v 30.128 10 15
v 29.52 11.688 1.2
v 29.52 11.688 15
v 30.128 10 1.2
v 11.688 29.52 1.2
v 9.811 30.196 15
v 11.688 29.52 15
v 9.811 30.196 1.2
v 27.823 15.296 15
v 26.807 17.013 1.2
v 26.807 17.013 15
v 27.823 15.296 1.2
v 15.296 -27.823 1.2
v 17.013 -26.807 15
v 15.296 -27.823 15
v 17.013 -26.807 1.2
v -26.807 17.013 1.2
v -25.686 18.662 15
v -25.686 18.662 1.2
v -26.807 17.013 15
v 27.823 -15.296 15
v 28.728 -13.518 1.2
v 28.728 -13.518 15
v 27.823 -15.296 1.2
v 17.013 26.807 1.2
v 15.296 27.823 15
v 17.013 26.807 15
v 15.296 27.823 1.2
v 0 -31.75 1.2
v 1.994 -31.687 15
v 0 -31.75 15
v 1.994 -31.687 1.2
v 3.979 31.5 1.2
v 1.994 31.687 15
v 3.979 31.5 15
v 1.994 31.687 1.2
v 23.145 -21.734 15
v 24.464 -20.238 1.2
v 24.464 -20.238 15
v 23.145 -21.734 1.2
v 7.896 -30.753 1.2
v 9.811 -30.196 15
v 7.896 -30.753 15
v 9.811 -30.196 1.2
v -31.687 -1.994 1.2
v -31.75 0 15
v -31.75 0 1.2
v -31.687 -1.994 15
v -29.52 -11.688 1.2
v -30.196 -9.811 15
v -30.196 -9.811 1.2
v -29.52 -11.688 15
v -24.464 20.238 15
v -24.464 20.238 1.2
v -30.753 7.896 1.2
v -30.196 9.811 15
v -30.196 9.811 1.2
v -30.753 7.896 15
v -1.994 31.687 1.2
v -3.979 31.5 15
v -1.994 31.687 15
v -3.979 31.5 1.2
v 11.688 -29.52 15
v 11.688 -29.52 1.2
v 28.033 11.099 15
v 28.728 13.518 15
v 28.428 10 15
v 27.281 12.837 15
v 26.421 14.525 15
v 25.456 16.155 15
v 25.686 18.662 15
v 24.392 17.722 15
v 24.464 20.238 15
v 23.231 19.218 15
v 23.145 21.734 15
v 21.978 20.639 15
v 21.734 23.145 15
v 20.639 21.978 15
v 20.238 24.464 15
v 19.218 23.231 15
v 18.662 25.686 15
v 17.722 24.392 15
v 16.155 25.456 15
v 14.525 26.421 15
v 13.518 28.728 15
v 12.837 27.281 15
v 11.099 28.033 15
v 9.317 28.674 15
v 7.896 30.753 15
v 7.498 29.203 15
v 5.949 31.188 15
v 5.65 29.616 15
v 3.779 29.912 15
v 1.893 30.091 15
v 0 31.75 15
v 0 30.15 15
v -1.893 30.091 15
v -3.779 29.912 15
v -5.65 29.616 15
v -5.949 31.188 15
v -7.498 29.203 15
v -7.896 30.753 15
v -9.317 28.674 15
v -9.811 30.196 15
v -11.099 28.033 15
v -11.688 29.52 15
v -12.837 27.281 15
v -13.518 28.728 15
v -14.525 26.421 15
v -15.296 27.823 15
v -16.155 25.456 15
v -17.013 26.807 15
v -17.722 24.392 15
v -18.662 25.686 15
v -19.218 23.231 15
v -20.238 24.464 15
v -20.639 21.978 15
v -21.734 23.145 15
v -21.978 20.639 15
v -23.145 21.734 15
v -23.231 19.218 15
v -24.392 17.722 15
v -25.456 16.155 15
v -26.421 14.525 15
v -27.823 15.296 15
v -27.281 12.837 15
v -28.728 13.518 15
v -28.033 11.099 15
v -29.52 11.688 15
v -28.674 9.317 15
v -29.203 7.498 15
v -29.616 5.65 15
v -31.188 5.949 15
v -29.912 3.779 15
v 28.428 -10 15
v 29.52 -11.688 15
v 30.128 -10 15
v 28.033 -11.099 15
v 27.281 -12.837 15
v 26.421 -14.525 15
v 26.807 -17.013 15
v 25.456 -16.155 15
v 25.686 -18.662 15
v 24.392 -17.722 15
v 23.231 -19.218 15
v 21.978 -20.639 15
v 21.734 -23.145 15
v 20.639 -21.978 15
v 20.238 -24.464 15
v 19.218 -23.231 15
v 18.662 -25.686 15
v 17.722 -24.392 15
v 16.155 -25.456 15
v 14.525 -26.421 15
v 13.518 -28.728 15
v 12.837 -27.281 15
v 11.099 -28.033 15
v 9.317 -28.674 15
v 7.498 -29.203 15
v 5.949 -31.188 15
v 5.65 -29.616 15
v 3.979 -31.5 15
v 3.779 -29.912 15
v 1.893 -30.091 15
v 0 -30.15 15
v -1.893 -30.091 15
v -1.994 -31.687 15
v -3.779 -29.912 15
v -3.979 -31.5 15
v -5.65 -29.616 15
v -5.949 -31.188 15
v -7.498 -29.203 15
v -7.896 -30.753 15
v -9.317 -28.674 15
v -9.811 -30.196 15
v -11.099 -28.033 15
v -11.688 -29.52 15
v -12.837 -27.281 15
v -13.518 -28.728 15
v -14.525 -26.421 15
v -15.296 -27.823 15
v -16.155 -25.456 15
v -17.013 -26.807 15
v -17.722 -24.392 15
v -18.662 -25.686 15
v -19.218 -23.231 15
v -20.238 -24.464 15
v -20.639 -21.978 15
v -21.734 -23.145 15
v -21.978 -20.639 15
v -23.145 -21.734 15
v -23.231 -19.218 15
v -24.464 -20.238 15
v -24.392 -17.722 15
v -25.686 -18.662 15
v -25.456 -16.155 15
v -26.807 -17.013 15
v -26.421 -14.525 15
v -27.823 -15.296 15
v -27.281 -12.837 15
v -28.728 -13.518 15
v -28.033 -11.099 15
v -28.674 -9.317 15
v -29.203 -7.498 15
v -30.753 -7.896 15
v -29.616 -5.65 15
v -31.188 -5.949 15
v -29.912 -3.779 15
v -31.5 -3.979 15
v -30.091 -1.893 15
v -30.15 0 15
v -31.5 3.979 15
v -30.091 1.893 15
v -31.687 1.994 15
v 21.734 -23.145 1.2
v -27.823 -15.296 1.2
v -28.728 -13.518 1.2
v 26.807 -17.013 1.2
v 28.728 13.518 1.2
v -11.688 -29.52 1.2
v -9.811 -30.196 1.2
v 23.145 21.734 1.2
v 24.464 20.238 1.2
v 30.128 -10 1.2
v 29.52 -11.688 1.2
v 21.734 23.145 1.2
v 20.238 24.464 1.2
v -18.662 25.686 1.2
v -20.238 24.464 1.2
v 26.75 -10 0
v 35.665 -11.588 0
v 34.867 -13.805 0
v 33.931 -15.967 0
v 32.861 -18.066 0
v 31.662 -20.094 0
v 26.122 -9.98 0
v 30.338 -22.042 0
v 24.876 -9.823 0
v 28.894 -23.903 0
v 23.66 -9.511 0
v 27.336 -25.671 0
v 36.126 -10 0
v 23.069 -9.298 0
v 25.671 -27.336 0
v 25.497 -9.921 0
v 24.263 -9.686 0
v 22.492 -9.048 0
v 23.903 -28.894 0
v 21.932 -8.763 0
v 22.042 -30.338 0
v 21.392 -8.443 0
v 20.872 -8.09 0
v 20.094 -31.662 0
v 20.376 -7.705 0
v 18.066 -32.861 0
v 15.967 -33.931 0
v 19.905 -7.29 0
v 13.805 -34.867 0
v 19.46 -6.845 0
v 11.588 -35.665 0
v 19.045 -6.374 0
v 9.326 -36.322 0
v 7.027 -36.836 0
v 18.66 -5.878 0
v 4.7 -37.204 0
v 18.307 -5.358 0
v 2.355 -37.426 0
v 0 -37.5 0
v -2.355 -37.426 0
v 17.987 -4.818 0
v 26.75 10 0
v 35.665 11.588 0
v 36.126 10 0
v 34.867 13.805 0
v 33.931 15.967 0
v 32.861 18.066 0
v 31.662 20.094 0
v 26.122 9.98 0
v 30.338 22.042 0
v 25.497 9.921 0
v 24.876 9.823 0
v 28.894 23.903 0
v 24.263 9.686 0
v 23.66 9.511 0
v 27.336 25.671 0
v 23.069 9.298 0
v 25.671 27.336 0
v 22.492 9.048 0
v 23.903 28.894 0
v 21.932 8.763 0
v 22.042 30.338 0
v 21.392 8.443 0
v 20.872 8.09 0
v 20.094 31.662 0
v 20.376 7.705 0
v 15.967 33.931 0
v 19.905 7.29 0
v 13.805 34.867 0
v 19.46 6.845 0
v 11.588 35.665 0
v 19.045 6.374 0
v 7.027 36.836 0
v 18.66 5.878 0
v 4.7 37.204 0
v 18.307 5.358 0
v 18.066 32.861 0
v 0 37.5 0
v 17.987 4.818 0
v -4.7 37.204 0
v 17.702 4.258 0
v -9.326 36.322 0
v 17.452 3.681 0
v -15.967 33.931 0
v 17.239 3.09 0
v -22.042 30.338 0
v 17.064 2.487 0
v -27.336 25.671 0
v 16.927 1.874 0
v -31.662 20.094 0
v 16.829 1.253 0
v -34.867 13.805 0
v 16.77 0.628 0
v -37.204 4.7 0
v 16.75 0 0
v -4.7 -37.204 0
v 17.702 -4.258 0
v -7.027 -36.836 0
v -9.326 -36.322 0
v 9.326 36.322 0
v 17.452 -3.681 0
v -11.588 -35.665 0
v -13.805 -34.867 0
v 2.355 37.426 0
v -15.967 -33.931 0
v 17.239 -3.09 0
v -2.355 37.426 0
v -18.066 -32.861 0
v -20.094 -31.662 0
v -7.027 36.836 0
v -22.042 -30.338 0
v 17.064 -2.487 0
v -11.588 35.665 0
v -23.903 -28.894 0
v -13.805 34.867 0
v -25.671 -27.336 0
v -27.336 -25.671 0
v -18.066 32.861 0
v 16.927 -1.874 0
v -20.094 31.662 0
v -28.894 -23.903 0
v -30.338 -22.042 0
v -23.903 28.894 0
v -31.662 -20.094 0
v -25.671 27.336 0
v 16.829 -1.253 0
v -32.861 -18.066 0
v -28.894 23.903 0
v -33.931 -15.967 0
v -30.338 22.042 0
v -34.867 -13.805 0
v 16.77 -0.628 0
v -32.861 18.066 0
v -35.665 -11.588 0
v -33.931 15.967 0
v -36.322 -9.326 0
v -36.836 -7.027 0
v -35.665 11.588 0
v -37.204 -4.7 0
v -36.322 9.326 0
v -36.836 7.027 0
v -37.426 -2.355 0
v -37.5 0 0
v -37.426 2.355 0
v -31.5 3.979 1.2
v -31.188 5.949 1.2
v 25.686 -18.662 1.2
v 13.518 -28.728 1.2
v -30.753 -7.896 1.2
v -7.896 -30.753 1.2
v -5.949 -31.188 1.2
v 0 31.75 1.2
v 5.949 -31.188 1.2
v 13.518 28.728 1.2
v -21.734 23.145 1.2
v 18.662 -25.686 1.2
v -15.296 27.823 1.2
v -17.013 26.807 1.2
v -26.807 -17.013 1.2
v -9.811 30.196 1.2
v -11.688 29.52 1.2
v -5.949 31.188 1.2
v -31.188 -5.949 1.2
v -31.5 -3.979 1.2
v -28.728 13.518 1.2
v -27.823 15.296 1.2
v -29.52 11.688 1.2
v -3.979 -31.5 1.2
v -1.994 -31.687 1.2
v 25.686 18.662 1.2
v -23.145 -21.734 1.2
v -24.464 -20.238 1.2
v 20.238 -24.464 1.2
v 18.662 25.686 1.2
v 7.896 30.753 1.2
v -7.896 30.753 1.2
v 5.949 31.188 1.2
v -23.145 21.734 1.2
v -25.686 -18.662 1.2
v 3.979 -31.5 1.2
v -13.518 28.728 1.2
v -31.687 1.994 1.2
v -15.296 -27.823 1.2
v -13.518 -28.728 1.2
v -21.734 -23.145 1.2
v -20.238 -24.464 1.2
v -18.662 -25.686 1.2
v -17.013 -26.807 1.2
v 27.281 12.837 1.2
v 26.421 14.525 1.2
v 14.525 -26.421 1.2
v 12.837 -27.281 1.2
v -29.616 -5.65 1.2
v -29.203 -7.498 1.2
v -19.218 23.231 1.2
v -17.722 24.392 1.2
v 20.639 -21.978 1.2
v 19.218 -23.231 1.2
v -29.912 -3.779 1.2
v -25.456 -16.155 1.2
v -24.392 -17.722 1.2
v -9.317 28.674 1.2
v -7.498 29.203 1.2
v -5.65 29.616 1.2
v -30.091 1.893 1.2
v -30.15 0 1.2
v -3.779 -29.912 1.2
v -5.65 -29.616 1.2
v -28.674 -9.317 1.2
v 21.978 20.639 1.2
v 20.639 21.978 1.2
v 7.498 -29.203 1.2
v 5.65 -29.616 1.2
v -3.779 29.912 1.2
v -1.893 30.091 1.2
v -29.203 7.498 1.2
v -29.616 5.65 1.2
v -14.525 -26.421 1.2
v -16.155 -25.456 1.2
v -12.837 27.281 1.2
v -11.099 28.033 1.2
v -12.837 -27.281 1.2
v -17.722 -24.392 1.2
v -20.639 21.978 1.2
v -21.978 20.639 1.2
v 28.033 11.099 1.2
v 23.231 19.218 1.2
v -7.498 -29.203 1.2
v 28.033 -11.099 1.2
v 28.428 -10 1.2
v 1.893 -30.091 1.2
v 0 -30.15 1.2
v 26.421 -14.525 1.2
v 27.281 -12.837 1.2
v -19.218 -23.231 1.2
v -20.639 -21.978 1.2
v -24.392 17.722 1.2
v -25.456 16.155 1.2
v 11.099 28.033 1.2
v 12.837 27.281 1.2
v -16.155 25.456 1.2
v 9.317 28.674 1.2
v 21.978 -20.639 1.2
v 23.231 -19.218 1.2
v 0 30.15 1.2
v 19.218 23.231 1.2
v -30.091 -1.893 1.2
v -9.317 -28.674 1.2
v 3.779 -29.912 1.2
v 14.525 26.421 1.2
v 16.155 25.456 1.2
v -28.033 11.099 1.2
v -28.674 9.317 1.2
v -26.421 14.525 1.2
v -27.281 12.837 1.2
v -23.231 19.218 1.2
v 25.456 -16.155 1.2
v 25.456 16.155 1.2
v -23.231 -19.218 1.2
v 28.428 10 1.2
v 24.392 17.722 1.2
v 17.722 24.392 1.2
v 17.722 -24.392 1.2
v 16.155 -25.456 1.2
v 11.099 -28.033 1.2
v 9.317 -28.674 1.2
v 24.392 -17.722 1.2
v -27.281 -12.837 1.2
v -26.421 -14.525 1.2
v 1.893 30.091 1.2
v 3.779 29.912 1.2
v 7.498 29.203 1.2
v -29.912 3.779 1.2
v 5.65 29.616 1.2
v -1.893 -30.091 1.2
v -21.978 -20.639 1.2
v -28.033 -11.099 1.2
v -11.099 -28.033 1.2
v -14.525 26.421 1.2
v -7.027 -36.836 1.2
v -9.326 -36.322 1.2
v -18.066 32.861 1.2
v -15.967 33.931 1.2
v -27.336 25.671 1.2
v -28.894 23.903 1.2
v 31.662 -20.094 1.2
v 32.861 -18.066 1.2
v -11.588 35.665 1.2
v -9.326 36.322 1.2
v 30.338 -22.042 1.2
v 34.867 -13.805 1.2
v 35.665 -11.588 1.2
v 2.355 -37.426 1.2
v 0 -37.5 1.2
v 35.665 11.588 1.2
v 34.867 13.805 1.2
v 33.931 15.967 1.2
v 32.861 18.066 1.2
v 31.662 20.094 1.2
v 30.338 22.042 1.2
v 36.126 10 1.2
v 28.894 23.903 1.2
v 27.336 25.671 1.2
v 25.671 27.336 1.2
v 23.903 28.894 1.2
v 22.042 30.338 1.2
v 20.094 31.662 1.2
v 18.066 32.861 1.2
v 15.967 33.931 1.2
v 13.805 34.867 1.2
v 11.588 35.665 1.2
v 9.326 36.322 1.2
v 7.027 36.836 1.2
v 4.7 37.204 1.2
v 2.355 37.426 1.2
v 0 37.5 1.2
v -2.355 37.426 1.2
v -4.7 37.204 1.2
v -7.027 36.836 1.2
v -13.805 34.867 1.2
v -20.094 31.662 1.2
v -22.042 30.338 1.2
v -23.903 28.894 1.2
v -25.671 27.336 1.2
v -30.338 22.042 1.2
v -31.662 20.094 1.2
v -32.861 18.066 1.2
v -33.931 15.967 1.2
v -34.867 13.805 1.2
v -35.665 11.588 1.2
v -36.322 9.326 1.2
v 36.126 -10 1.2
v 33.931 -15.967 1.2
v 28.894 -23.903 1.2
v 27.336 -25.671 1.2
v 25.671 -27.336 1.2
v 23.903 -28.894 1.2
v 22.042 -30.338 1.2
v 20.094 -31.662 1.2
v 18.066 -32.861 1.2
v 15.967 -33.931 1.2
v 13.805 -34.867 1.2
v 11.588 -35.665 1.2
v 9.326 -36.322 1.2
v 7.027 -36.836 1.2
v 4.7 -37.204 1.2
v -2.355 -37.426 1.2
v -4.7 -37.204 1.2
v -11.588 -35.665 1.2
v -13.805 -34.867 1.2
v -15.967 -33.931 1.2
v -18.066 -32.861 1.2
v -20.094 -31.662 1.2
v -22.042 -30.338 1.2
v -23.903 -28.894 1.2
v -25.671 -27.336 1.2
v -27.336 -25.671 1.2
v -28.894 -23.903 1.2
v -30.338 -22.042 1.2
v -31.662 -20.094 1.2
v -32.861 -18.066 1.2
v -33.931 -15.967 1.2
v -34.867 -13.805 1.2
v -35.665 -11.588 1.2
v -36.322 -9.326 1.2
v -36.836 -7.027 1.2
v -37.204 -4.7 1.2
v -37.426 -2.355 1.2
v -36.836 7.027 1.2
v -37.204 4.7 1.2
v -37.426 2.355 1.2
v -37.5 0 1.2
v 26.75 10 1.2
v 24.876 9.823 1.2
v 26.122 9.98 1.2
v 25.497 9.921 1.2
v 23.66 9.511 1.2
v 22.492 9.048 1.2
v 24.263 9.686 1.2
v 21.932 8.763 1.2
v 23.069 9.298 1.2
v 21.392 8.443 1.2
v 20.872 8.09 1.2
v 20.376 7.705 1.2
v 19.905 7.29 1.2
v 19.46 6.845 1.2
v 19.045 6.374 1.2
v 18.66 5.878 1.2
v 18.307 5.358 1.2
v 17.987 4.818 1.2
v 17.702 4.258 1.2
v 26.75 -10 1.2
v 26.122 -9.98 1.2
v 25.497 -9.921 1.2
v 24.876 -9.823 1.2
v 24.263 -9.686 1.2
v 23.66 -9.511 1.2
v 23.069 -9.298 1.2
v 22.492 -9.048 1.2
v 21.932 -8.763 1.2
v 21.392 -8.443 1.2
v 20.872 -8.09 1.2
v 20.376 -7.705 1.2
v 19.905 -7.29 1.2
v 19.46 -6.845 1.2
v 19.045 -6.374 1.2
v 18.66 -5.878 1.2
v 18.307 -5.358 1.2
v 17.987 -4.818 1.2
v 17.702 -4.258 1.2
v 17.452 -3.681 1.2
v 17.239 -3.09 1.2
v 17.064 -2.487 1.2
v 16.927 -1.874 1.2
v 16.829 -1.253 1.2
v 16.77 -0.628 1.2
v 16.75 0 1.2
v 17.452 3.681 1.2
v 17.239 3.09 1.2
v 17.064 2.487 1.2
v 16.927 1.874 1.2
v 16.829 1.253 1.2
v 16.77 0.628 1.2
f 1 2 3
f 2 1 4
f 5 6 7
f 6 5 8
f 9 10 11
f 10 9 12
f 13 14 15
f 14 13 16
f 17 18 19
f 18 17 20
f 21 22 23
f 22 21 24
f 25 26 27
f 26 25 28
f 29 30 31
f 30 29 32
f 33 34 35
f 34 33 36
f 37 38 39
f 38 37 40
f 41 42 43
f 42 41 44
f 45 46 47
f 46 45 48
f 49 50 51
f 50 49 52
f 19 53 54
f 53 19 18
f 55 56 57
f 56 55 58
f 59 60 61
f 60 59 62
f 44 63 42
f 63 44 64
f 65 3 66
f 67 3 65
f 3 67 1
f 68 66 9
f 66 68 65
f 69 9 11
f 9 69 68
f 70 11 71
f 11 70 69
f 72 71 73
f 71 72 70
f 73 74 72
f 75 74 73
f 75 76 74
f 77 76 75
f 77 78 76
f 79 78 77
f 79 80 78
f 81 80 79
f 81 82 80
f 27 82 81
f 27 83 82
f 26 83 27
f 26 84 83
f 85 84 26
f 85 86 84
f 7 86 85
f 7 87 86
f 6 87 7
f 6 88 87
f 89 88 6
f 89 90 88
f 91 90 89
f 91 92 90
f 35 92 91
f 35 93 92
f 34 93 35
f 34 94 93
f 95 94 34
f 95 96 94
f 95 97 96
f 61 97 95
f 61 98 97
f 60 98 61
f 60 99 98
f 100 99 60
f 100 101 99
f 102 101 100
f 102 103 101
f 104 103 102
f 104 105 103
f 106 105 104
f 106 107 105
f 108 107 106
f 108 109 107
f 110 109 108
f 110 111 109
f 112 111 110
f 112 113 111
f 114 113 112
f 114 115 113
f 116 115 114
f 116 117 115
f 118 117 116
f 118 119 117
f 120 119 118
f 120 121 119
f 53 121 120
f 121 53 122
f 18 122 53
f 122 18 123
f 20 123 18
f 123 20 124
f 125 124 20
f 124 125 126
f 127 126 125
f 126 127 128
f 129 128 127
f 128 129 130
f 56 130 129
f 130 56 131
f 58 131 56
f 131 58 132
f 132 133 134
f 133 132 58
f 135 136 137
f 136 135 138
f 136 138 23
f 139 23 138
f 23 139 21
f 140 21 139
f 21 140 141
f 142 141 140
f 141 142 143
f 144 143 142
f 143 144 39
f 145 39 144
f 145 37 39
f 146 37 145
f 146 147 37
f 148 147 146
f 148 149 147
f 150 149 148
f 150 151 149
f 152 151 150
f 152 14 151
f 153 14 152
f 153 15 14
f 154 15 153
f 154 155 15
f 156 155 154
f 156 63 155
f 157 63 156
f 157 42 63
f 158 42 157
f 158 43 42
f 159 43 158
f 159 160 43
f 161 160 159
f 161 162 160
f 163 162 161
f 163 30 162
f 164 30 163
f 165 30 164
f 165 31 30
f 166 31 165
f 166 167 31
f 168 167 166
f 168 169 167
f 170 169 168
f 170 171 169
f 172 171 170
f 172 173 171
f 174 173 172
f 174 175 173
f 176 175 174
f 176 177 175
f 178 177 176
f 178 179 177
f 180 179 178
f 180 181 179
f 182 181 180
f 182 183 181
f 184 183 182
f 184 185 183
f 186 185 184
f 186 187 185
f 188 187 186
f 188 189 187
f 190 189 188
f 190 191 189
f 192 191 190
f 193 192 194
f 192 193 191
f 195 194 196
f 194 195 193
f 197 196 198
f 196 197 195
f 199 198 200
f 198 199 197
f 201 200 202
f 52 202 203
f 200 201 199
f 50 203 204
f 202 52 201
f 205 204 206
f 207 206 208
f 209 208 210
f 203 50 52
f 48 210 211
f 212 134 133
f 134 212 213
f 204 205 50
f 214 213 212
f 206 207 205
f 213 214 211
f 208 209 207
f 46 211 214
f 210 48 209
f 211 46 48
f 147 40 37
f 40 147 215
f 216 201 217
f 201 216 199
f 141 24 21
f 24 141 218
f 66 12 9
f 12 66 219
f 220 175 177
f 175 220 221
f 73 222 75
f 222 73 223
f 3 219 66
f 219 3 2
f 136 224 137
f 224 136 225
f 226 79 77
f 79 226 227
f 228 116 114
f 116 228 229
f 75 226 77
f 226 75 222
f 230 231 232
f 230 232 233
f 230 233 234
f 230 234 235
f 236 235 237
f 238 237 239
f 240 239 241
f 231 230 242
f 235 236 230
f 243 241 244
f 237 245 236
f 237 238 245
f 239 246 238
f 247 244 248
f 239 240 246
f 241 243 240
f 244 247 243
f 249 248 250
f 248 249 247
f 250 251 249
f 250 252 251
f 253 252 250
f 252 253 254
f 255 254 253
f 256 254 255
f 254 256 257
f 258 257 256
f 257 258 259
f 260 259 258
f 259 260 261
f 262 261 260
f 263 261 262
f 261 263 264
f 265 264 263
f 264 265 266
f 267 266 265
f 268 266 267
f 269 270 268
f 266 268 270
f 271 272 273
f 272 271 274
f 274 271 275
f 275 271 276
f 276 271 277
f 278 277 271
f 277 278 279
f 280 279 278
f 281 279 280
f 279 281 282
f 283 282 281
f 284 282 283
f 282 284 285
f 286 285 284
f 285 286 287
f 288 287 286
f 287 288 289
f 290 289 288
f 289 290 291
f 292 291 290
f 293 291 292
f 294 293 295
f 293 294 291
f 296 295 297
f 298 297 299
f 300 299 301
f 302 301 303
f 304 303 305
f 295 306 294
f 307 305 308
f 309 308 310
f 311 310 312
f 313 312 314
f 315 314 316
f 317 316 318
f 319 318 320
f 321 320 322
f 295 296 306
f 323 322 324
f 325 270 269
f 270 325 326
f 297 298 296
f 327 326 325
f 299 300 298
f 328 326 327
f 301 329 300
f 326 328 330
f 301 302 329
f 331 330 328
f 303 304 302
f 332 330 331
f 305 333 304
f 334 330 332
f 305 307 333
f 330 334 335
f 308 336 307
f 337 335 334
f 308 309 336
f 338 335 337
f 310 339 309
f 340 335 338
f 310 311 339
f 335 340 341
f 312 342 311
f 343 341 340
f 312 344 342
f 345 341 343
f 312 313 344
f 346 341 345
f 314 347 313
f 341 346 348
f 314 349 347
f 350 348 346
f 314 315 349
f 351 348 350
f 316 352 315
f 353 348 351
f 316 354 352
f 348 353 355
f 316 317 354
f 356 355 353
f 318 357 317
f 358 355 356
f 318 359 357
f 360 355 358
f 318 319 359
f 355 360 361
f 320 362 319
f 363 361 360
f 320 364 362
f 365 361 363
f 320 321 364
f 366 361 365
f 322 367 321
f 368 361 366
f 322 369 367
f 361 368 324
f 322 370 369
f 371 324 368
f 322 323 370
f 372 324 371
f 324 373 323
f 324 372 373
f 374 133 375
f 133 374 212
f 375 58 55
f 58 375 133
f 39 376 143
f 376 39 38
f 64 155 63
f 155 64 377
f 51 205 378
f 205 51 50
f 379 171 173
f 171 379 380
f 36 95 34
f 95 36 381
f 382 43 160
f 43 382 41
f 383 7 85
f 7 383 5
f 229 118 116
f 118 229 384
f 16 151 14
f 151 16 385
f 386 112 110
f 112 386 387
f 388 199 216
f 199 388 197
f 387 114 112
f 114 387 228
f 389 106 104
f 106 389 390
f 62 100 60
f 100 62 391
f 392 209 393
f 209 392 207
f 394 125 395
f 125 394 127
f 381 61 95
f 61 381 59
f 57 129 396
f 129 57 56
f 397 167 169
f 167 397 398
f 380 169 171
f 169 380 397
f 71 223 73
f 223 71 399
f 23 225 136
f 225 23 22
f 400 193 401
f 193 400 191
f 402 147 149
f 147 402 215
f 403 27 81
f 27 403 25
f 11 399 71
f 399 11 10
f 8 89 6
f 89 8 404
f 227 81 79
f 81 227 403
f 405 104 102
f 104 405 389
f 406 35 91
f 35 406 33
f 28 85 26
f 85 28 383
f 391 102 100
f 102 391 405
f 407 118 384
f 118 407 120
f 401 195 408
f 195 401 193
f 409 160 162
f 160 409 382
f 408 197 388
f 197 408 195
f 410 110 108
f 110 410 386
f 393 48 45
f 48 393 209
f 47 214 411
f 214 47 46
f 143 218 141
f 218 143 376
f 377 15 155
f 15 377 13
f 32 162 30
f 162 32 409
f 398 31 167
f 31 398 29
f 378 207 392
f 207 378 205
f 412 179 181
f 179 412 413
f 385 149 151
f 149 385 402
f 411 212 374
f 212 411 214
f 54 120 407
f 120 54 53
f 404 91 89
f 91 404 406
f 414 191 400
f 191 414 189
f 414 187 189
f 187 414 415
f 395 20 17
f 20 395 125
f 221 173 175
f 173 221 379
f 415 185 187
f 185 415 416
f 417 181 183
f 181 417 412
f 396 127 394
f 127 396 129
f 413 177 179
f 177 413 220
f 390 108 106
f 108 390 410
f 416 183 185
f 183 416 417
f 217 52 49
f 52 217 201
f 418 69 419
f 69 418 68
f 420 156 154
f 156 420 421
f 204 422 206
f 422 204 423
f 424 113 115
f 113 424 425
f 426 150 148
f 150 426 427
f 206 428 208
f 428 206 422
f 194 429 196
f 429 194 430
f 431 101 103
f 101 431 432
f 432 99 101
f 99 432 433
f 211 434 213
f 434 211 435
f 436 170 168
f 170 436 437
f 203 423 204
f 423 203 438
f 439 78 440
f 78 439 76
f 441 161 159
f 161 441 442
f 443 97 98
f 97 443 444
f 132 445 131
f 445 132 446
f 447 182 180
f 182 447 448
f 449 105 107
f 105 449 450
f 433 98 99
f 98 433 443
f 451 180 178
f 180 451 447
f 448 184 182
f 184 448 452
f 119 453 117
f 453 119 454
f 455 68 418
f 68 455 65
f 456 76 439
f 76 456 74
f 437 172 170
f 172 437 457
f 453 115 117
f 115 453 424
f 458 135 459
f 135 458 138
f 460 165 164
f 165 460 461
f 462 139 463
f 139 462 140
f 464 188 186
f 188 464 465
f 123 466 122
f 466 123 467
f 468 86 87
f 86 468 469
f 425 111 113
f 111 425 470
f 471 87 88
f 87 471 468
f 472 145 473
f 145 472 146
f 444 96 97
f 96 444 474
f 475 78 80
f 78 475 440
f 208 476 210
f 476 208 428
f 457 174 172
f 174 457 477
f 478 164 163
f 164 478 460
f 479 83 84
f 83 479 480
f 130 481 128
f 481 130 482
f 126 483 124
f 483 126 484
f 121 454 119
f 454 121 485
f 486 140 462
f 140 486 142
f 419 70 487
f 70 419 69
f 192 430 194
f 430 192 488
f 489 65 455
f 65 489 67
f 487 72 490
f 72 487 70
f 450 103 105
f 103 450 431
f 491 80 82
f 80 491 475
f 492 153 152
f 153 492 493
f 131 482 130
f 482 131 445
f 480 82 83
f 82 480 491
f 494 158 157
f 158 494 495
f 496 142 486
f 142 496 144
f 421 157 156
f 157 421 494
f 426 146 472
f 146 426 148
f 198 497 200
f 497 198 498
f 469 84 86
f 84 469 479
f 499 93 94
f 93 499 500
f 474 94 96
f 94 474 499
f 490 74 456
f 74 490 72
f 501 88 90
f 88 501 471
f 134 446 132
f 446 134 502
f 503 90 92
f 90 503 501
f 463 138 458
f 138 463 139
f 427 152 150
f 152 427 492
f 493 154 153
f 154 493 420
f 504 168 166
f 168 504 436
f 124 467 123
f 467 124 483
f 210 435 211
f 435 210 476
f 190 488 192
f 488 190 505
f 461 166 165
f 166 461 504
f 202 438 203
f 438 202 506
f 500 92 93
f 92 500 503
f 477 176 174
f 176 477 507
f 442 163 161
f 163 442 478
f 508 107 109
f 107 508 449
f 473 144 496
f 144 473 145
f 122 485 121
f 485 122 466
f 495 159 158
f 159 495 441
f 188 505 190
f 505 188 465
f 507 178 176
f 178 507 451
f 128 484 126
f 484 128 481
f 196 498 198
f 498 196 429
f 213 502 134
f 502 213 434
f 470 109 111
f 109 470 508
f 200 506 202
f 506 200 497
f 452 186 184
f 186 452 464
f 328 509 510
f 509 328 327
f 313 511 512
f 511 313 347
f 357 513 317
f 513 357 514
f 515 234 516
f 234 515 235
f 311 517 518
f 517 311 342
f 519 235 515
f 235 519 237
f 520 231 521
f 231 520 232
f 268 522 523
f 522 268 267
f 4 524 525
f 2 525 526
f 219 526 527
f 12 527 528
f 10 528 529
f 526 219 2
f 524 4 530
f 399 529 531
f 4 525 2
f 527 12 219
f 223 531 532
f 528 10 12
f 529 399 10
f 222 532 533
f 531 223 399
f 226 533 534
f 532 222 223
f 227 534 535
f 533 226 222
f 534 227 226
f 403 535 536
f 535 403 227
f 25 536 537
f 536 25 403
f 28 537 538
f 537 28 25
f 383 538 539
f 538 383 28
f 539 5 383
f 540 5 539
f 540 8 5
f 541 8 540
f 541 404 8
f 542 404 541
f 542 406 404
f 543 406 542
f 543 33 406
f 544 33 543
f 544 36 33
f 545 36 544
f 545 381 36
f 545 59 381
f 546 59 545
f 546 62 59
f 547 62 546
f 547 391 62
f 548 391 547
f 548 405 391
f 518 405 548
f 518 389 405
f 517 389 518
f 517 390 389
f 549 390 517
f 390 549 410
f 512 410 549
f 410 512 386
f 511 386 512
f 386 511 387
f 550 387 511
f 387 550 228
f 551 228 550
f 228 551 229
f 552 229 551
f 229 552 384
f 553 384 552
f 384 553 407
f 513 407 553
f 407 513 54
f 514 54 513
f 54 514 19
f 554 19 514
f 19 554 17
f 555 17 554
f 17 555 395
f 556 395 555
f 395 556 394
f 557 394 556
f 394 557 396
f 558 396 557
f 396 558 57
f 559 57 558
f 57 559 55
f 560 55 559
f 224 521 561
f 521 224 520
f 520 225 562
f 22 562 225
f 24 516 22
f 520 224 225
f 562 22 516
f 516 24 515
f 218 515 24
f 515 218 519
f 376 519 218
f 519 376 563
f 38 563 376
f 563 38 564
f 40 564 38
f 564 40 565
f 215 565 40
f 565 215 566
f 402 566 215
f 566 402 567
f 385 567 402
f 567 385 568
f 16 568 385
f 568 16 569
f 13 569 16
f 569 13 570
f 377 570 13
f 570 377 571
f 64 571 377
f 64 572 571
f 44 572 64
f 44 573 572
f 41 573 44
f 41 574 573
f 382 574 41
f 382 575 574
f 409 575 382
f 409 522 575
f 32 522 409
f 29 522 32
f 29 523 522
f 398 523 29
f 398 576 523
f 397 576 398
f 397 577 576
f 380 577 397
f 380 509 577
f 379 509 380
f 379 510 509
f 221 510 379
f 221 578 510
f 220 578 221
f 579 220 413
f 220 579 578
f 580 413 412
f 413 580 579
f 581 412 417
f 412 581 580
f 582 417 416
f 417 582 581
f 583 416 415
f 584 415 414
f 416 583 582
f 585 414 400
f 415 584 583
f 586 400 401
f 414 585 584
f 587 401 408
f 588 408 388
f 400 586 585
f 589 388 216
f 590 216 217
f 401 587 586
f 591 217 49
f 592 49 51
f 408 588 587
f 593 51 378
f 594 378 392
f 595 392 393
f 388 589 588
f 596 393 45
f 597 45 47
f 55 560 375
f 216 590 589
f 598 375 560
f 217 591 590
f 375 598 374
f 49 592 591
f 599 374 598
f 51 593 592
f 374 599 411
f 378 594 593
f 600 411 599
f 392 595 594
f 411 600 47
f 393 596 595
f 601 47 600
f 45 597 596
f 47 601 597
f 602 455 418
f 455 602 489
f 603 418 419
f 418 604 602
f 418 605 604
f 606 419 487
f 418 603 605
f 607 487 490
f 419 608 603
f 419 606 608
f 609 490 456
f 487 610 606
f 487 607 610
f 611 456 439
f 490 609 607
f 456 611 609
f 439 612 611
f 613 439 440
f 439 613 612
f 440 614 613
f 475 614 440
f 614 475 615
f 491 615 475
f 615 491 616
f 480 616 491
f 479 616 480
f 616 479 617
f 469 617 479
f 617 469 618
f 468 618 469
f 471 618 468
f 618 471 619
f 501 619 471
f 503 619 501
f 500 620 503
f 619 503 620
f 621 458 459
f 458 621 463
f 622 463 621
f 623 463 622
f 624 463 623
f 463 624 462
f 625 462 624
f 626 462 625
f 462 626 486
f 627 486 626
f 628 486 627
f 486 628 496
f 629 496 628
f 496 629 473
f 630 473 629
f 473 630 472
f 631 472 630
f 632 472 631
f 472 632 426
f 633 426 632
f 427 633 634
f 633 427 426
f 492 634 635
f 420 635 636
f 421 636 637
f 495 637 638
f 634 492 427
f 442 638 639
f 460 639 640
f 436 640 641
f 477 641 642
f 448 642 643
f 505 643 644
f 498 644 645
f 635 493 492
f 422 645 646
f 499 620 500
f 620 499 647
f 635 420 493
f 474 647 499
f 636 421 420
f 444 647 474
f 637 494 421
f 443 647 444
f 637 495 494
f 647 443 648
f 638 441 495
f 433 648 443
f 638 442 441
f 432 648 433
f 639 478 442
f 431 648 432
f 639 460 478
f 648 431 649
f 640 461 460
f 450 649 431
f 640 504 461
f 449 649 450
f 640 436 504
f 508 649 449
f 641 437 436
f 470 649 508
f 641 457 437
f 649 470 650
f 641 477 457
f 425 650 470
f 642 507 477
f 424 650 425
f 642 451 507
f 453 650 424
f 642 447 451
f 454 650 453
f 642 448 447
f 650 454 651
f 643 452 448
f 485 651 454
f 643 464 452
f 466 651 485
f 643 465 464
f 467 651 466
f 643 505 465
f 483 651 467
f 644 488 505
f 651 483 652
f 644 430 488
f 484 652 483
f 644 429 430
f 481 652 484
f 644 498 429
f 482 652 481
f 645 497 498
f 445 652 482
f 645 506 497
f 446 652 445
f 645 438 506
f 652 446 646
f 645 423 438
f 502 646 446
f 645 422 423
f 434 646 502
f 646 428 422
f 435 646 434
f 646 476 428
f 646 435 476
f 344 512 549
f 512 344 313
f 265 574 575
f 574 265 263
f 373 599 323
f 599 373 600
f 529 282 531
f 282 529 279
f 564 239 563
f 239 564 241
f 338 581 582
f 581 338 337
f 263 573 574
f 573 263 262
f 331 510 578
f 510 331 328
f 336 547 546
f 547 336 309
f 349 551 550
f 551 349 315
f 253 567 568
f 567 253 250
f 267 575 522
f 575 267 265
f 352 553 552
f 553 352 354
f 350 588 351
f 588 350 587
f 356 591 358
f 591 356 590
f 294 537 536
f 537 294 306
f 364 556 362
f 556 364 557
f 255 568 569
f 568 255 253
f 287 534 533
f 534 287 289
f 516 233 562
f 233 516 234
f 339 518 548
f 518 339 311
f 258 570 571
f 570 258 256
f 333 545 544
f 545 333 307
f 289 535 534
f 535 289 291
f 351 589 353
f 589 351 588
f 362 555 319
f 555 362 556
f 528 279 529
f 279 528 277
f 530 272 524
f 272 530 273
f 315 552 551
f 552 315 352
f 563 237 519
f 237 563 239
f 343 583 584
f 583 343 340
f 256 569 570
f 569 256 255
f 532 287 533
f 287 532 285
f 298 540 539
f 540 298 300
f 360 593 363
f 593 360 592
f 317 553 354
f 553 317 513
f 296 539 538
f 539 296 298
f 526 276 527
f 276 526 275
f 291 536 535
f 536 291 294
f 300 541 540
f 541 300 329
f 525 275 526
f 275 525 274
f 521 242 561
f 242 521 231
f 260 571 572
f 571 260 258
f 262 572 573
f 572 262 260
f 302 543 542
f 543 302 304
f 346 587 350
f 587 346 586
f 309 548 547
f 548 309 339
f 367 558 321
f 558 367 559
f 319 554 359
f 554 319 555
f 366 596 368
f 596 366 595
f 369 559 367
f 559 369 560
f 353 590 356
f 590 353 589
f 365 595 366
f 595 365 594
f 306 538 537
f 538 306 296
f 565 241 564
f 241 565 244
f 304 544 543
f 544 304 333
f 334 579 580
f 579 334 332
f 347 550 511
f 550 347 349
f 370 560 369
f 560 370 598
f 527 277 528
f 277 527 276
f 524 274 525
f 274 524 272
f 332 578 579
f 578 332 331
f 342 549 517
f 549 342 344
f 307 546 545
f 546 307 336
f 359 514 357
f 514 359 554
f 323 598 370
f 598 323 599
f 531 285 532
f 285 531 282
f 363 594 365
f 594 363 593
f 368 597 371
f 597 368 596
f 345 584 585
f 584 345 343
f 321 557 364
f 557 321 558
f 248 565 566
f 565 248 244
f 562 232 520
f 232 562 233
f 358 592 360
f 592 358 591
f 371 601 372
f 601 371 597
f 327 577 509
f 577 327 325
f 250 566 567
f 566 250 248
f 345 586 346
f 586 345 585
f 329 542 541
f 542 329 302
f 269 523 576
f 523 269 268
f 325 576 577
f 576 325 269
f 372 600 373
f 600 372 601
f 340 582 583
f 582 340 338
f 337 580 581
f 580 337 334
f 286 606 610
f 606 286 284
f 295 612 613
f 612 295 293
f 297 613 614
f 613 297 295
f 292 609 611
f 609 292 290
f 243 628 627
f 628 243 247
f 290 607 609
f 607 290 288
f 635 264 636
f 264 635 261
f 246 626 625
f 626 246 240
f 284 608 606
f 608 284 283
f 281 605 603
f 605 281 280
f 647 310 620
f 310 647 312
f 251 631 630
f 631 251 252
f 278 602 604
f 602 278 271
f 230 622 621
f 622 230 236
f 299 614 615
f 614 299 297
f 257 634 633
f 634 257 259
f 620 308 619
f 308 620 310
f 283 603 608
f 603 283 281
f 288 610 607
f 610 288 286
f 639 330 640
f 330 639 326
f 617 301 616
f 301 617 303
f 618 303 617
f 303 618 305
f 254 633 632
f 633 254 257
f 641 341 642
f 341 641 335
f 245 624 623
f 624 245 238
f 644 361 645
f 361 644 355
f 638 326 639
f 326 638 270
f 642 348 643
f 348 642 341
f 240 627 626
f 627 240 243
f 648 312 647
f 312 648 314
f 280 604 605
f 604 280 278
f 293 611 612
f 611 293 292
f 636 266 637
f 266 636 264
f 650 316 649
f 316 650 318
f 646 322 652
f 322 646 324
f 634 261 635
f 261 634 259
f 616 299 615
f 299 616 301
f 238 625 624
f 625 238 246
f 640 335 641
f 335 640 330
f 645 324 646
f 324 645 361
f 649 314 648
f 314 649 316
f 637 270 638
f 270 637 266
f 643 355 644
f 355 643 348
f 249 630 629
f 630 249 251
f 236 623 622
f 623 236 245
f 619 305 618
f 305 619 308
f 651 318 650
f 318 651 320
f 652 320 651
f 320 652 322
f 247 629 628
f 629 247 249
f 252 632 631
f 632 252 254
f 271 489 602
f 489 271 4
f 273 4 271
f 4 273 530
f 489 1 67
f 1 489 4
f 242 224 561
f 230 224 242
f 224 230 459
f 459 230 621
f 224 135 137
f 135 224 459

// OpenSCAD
// file: ../sc.scad
// ShortCuts.scad 
// Autor: Rudolf Huttary, Berlin 2015
//
$fn = 100; 

//show_examples(); 

module show_examples()
	place_in_rect(30, 30)
	{
		Cy(h = 10); 
		CyH(h = 10); 
		CyH(h = 10, w = 30); 
		CyS(h = 10); 
		CyS(h = 10, w1 = 25, w2 = 75); 
		Cu(10); 
		Ri(h = 10); 
		RiH(h = 10); 
		RiS(h = 10, w1 = 10); 
		RiS(h = 10, w1 = 30, w2 = 300); 
		Sp(); 
		SpH(10, 30, 30); 
	}


module help()
{
echo("==============="); 
echo("help(): shows this help"); 
echo("show_examples(): shows some examples"); 
echo("place_in_rect(): places children objects in grid"); 
echo("Transformations:"); 
echo(" transform :  T(x=0, y=0, z=0), Tx(x=0) , Ty(y=0), Tz(z=0)"); 
echo(" rotate :  R(x=0, y=0, z=0), Rx(x=0) , Ry(y=0), Rz(z=0)"); 
echo(" scale :  S(x=1, y=1, z=1), Sx(x=1) , Sy(y=1), Sz(z=1)"); 
echo("Logical"); 
echo(" difference :  D()"); 
echo(" union :  U()"); 
echo(" intersection : *missing*"); 
echo("Primitives"); 
echo(" circle :  Ci(r=10)"); 
echo(" circle_half :  CiH(r=10, w=0)")
echo(" circle_segment :  CiS(r=10, w1=0, w2=90)")
echo(" square :  Sq(x=10, y=0, center=true))"); 
echo(" cylinder :  Cy(r=10, h=1, center=true)"); 
echo(" cylinder_half :  CyH(r=10, w=0)")
echo(" cylinder_segment: CyS(r=10, h=1, w1=0, w2=90,center=true)"); 
echo(" cylinder_segment: Pie(r=10, h=1, w1=0, w2=90,center=true)"); 
echo(" cube :  Cu(x=10, y=0, z=10, center=true)"); 
echo(" ring :  Ri(R=10, r=5, h=1, center=true)"); 
echo(" ring_half :  RiH(R=10, r=5, h=1, w=0 center=true)"); 
echo(" ring_segment :  RiS(R=10, r=5, h=1, w1=0, w2=90, center=true)"); 
echo(" sphere:  Sp(r=10))"); 
echo(" sphere_half:  SpH(r=10, w1 = 0, w2 = 0))"); 
echo("==============="); 
}

// Euclidean Transformations
module T(x=0, y=0, z=0){translate([x, y, z])children(); }
module Tx(x) { translate([x, 0, 0])children(); }
module Ty(y) { translate([0, y, 0])children(); }
module Tz(z) { translate([0, 0, z])children(); }

module R(x=0, y=0, z=0){rotate([x, y, z]) children();}
module Rx(x=90){rotate([x, 0, 0]) children();}
module Ry(y=90){rotate([0, y, 0]) children();}
module Rz(z=90){rotate([0, 0, z]) children();}

module M(x=0, y=0, z=0){mirror([x, y, z]) children();}
module Mx(x=1){mirror([x, 0, 0]) children();}
module My(y=1){mirror([0, y, 0]) children();}
module Mz(z=1){mirror([0, 0, z]) children();}

module S(x=1, y=1, z=1){scale([x, y, z]) children();}
module Sx(x=1){scale([x, 1, 1]) children();}
module Sy(y=1){scale([1, y, 1]) children();}
module Sz(z=1){scale([1, 1, z]) children();}

module D() difference(){children(0); children([1:$children-1]);}
module U() children([0:$children-1]);
// module I() intersection()children([0:$children-1]); // does not work for some reason


// primitives - 2D

module Sq(x =10, y = 0, center = false)
{
   if(y==0)
		square([x, x], center = center); 
	else
		square([x, y], center = center); 
}
module Ci(r = 10)
{
	circle(r = r); 
}

// derived primitives - 2d
module CiH(r = 10, w = 0)
  circle_half(r, w); 

module CiS(r = 10, w1 = 0, w2 = 90)
  circle_segment(r, w1, w2); 


// primitives - 3d
module Cy(r = 10, h = 1, center = false)
{
	cylinder(r = r, h = h, center = center); 
}
module Cu(x = 10, y = 0, z = 10, center = false)
{
  if (y==0)
	cube([x, x, x], center = center); 
  else
	cube([x, y, z], center = center); 
}

// derived primitives - 3d
module CyH(r = 10, h = 1, w = 0, center = false)
  cylinder_half(r, h, w, center); 

module CyS(r = 10, h = 1, w1 = 0, w2 = 90, center = false)
  cylinder_segment(r, h, w1, w2, center); 

module Ri(R = 10, r = 5, h = 1, center = false)
  ring(R, r, h, center); 

module RiS(R = 10, r = 5, h = 1, w1 = 0, w2 = 90, center = false)
   ring_segment(R, r, h, w1, w2, center); 

module RiH(r1 = 10, r2, h = 1, w = 0, center = false)
   ring_half(r1, r2, h, w, center); 
module Pie(r = 10, h = 1, w1 = 0, w2 = 90, center = false)
  cylinder_segment(r, h, w1, w2, center);  
module Sp(r = 10)
  sphere(r); 
module SpH(r = 10, w1 = 0, w2 = 0)
  sphere_half(r, w1, w2); 
module SpS(r = 10, w1 = 0, w2 = 90, w3 = 90)
  sphere_segment(r, w1, w2); 




// clear text definitions
module circle_half(r = 10, w = 0)
{
	difference()
	{
		circle(r); 
     rotate([0, 0, w-90])
     translate([0, -r])
		square([r, 2*r], center = false); 
	}
}

module circle_segment(r = 10, w1 = 0, w2 = 90)
{
  W2 = (w1>w2)?w2+360:w2; 
  if (W2-w1 < 180)
    intersection()
		{
       circle_half(r, w1); 
       circle_half(r, W2-180); 
 		}
	else
    union()
		{
       circle_half(r, w1); 
       circle_half(r, W2-180); 
 		}
}

module cylinder_half(r = 10, h = 1, w = 0, center = true)
{
  linear_extrude(height = h, center = center)
  circle_half(r, w); 
} 

module cylinder_segment(r = 10, h = 1, w1 = 0, w2 = 90, center = true)
{
  linear_extrude(height = h, center = center)
  circle_segment(r, w1, w2); 
} 

module ring(R = 10, r = 5, h = 1, center = true)
{
	difference()
	{
	cylinder(r = R, h = h, center = center); 
   translate([0, 0, -2*h])
	cylinder(r = r, h = 4*h, center = false); 
	}
}

module ring_half(R = 10, r = 5, h = 1, w = 0, center = true)
{
	difference()
	{
		ring(R, r, h, center); 
     rotate([0, 0, w])
     translate([0, -R/2, 0])
		cube([2*R, R, 3*h], center = true); 
	}
}

module ring_segment(R = 10, r = 5, h = 1, w1 = 0, w2 = 90, center = true)
{
  W2 = (w1>w2)?w2+360:w2; 
  if (W2-w1 < 180)
    intersection()
		{
       ring_half(R, r, h, w1, center); 
       ring_half(R, r, h, W2-180, center); 
 		}
	else
    union()
		{
       ring_half(R, r, h, w1, center); 
       ring_half(R, r, h, W2-180, center); 
 		}
}


module sphere_half(r = 10, w1 = 0, w2 = 0)
{  
	difference()
	{
   	sphere(r); 
      rotate([-w1, -w2, 0])
     	translate([0, 0, r])
		cube([2*r, 2*r, r], center = true); 
	}

}


// additional code
module place_in_rect(dx =20, dy=20)
{
  cols = ceil(sqrt($children)); 
  rows = floor(sqrt($children)); 
  for(i = [0:$children-1])
	{ 
	  T(dx*(-cols/2+(i%cols)+.5), dy*(rows/2-floor(i/cols)-.5))
		 children(i); 
	}
}
// main file
use <../lib.scad>
$fn=100;

lineHeigth=0.20;
lineWidth=0.80;

dout=75;
height=15;
thick=1.01;
hole=20;

hole_pos=5;
din = 63.5;

//hole_pos=-55;
//din=60;

/************************************/
h=multiple(height, lineHeigth);
t=multiple(thick, lineWidth);
th=multiple(thick, lineHeigth);


cap();


module cap(){
difference(){
    union(){
        cylinder(d=dout, h=th);
        difference(){
            cylinder(d=din, h=h);
            cylinder(d=din-t*2, h=h+1);
        }
    }

    //------------------------------------------------------  
    translate([-hole_pos,0,0]){
        translate([din/2,0,-.1])
        cylinder(d=hole, h=h*2);
        translate([din/2,-hole/2,-.1])
        cube([hole,hole,h*2]);
    }
    /**/
}    
}
